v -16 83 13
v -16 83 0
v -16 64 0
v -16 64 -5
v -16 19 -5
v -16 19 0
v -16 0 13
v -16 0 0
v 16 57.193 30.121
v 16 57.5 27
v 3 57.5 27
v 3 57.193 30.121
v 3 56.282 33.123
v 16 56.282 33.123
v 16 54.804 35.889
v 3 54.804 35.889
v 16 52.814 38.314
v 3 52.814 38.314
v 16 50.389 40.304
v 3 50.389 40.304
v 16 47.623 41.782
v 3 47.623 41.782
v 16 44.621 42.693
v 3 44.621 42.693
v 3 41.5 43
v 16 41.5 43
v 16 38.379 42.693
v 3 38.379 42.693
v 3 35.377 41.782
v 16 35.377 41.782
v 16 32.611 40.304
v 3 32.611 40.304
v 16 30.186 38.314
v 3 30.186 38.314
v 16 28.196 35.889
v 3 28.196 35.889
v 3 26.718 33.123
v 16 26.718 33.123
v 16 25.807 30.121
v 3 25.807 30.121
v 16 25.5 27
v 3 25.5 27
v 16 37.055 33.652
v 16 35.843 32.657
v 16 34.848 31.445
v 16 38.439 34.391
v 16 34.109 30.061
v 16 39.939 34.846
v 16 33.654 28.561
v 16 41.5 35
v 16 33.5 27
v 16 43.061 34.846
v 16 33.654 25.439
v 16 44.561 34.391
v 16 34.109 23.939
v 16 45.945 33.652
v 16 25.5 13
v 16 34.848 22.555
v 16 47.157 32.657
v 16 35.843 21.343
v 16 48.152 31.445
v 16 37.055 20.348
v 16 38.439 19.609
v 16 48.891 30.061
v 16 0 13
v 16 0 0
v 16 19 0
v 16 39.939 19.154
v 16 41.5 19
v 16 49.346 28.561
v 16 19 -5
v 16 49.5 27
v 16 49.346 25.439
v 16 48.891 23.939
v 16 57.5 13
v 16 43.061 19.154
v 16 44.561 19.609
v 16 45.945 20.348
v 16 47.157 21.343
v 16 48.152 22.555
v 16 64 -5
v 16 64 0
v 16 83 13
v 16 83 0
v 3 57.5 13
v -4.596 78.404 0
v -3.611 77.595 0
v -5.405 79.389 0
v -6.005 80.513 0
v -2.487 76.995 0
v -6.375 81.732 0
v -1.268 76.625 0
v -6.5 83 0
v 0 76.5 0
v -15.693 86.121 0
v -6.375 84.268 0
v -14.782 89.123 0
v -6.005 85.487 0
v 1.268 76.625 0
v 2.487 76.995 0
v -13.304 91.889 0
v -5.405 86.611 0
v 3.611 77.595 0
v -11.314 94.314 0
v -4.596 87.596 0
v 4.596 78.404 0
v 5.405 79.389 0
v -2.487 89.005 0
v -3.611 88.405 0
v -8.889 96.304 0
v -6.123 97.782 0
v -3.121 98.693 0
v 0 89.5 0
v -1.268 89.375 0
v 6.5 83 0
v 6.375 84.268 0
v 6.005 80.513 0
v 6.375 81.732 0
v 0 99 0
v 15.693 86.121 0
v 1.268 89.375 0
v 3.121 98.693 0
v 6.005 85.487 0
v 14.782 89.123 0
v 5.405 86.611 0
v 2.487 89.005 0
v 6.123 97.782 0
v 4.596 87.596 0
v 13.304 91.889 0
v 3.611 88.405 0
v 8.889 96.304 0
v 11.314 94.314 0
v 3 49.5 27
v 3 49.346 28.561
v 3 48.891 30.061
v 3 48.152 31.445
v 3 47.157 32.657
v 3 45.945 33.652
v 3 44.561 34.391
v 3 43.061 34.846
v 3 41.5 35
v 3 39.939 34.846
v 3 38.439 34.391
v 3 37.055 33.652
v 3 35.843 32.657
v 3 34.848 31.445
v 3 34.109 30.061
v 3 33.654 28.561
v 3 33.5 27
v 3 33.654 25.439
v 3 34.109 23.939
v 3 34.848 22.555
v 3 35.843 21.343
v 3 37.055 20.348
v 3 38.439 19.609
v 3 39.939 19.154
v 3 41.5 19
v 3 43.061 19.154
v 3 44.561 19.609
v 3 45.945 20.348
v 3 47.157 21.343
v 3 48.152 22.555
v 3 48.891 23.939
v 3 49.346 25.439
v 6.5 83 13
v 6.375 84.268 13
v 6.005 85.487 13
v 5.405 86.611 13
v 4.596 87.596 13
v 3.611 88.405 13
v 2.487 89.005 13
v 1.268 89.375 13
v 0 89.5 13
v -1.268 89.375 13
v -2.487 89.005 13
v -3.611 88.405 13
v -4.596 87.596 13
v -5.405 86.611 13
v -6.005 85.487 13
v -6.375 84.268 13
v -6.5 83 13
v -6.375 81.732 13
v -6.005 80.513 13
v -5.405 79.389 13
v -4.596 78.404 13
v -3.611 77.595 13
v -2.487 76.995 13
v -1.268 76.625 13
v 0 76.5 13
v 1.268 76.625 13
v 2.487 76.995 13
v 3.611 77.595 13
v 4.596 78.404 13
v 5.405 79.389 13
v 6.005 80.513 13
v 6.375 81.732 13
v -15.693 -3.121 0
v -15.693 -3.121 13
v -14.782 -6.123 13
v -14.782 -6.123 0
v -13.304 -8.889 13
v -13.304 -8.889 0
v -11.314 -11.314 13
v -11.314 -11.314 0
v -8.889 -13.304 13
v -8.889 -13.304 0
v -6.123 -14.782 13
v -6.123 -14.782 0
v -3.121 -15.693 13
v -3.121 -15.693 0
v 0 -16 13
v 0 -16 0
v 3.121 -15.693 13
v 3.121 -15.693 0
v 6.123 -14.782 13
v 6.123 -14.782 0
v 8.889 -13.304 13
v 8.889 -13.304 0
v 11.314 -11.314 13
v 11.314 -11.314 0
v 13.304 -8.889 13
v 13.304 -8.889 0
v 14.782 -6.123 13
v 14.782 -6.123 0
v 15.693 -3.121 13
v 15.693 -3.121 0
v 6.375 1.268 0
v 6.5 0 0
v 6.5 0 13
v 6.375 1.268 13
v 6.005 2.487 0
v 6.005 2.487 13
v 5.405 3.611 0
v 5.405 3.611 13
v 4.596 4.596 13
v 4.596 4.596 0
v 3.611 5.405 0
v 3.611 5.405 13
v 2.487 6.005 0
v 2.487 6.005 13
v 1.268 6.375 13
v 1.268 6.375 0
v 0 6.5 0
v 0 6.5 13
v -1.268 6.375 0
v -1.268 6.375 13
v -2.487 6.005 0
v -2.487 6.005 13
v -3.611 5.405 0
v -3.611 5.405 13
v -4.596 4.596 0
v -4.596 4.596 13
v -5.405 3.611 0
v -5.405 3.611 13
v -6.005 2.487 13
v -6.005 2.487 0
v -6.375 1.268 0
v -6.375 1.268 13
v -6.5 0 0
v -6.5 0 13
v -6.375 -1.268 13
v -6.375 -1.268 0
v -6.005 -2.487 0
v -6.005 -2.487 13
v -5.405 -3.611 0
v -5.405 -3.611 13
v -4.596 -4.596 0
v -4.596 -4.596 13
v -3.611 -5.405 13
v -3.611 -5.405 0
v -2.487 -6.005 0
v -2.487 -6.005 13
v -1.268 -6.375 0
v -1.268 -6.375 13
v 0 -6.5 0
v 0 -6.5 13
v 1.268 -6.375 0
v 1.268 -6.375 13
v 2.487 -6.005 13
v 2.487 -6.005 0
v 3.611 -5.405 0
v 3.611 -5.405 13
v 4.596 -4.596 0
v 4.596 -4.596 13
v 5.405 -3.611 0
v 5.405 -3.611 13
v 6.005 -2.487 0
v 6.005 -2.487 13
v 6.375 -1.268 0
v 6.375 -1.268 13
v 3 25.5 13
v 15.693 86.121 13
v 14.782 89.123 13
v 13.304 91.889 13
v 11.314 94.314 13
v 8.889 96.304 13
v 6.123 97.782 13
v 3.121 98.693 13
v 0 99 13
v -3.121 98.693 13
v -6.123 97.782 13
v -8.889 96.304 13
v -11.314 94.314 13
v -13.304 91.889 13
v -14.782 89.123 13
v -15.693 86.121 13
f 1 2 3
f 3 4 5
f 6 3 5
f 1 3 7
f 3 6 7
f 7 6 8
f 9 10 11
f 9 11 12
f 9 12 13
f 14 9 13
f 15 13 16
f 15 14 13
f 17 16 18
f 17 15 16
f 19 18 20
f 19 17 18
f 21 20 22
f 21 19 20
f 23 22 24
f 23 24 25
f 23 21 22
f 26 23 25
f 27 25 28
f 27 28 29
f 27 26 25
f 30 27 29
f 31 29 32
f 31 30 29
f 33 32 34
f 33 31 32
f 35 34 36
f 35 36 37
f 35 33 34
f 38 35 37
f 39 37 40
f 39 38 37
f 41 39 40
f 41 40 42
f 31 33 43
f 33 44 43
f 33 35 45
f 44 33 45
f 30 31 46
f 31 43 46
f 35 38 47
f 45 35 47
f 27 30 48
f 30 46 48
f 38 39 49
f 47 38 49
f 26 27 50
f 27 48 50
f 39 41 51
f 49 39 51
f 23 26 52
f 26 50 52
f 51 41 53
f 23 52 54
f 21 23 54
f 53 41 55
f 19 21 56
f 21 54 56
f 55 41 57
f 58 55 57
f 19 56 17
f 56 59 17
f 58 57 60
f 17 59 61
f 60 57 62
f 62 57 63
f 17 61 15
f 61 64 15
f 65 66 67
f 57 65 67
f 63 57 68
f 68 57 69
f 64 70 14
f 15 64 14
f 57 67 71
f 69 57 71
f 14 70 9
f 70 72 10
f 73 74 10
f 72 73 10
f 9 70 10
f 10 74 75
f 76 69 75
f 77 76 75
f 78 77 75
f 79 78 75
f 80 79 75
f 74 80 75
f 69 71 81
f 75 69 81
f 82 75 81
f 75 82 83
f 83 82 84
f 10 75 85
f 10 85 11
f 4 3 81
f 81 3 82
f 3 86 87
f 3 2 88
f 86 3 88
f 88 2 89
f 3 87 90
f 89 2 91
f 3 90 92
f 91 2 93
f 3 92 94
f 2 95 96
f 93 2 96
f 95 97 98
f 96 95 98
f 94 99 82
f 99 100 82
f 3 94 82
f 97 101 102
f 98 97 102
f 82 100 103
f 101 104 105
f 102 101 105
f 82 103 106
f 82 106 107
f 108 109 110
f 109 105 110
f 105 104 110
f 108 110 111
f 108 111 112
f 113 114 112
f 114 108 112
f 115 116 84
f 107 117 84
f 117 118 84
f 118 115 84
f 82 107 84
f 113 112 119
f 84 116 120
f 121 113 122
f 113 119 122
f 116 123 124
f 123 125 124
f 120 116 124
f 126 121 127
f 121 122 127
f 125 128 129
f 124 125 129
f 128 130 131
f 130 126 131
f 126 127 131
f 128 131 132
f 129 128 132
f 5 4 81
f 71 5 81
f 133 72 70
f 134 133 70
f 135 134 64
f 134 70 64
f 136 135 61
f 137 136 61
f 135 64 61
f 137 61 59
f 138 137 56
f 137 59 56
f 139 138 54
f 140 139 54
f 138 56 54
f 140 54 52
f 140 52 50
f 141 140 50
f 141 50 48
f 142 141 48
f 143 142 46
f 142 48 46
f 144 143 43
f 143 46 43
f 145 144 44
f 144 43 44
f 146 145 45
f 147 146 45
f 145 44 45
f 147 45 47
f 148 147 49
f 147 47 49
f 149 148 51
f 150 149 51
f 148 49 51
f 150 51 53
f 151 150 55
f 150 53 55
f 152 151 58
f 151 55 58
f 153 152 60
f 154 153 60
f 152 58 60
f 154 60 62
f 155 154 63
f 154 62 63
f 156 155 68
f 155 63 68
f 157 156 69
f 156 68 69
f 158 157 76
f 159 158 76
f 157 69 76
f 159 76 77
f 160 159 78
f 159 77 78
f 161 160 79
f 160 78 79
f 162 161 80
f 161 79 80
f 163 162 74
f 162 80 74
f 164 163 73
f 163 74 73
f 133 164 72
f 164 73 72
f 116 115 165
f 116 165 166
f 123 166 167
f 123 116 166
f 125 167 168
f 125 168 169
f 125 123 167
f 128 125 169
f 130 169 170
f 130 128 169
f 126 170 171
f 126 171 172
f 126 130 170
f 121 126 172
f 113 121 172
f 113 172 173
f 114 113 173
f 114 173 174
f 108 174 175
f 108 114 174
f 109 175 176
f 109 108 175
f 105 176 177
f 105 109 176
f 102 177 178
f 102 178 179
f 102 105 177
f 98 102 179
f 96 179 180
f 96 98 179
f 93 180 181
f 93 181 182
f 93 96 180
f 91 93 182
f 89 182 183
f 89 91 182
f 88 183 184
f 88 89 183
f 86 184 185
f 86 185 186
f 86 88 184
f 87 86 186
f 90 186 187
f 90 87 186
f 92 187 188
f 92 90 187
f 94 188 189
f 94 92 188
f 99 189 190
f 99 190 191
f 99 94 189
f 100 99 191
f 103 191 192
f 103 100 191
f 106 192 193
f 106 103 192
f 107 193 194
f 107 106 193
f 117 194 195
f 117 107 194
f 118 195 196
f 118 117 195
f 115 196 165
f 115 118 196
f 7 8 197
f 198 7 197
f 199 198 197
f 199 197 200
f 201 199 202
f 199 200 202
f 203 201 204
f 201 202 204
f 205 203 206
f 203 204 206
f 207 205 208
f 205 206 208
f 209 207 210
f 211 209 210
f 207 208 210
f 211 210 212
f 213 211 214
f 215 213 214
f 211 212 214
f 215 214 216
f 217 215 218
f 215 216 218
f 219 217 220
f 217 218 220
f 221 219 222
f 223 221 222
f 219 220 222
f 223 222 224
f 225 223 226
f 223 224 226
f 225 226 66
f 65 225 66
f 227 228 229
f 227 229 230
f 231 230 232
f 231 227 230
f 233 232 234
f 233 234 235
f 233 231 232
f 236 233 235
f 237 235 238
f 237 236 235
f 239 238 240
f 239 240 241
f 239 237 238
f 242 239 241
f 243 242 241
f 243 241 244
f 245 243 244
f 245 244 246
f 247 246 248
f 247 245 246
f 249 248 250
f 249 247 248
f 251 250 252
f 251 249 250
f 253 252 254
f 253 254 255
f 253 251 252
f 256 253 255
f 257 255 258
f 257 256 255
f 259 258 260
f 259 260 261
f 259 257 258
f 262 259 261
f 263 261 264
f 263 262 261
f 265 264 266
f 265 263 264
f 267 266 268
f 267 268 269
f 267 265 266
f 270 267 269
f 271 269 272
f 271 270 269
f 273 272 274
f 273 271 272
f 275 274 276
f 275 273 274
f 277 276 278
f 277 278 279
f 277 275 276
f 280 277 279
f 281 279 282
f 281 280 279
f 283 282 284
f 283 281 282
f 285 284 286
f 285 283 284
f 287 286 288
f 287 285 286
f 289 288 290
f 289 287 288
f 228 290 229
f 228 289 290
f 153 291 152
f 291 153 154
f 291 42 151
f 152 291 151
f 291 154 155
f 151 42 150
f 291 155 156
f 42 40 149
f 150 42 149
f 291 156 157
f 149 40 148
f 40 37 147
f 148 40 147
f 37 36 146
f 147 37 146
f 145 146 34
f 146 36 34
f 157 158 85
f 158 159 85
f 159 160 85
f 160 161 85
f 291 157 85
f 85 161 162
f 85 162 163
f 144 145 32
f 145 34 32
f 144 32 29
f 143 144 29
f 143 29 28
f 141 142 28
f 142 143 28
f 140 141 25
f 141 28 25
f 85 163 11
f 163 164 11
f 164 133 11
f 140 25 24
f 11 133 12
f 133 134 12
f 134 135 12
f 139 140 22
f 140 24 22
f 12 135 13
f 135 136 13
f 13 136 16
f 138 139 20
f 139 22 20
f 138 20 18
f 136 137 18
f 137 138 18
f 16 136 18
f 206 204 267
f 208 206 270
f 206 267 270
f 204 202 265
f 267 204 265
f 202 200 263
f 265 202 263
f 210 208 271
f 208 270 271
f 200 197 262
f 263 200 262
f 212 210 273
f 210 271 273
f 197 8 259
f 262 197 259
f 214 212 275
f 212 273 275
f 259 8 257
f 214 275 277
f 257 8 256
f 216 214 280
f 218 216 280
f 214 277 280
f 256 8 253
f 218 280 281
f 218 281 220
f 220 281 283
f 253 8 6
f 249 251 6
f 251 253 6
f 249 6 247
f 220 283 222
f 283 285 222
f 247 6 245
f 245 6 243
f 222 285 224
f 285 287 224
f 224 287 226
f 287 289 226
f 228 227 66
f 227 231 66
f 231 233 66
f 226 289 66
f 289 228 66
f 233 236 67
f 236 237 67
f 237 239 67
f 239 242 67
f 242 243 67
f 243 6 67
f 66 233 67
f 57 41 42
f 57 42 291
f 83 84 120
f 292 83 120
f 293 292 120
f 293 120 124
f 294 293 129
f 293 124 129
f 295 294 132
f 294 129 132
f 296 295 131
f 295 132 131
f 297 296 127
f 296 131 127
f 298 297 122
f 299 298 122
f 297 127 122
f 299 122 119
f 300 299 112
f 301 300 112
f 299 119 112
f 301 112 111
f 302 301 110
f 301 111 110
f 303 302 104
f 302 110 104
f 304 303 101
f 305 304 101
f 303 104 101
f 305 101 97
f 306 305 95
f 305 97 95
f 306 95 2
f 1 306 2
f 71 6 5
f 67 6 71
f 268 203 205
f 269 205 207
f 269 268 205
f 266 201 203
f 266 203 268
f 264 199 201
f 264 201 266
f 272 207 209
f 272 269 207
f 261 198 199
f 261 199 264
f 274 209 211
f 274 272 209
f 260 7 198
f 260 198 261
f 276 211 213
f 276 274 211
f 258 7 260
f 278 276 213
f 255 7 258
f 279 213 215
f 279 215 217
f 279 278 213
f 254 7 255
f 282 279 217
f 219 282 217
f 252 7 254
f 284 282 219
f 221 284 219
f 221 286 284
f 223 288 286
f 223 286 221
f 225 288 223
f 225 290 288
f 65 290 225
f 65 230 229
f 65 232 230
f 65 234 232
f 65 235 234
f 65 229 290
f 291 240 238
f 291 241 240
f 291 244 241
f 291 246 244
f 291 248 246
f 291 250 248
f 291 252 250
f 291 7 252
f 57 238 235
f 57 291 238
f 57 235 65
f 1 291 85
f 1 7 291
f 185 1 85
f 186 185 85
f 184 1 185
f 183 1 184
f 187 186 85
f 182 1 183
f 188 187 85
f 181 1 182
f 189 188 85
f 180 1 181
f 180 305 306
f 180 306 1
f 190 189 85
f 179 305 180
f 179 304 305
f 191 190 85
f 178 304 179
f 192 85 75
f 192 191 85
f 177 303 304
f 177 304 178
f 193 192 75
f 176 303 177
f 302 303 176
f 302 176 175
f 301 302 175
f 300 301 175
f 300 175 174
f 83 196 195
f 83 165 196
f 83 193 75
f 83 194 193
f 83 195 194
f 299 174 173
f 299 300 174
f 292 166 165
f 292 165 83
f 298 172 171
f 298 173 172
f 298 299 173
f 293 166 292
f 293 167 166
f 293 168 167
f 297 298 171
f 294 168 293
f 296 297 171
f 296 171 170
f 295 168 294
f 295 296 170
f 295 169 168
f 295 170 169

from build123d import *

# Parameters (mm, degrees)
F0_W     = 32
F0_H     = 45
F0_R     = 6.5
F1_DEPTH = 13
F2_DEPTH = 5
F3_R     = 8
F4_DEPTH = 13


with BuildPart() as f1:
    # F0 (on Top) → F1 (new body)
    with BuildSketch(Plane.XY):
        with Locations((0, 41.5)):
            Rectangle(F0_W, F0_H)
        with BuildLine():
            Line((-16, 19), (-16, 0))
            ThreePointArc((-16, 0), (0, -16), (16, 0))
            Line((16, 0), (16, 19))
            Line((16, 19), (-16, 19))
        make_face()
        Circle(F0_R, mode=Mode.SUBTRACT)
        with BuildLine():
            Line((-16, 83), (-16, 64))
            Line((-16, 64), (16, 64))
            Line((16, 64), (16, 83))
            ThreePointArc((16, 83), (0, 99), (-16, 83))
        make_face()
        with Locations((0, 83)):
            Circle(F0_R, mode=Mode.SUBTRACT)
    extrude(amount=F1_DEPTH)

    # F0 (on Top) → F2 (join)
    with BuildSketch(Plane.XY):
        with Locations((0, 41.5)):
            Rectangle(F0_W, F0_H)
    extrude(amount=-F2_DEPTH)

    # F3 (on face) → F4 (join)
    with BuildSketch(Plane.YZ.offset(16)):
        with BuildLine():
            Line((57.5, 13), (57.5, 27))
            ThreePointArc((57.5, 27), (41.5, 43), (25.5, 27))
            Line((25.5, 27), (25.5, 13))
            Line((25.5, 13), (57.5, 13))
        make_face()
        with Locations((41.5, 27)):
            Circle(F3_R, mode=Mode.SUBTRACT)
    extrude(amount=-F4_DEPTH)


solid = f1.part
